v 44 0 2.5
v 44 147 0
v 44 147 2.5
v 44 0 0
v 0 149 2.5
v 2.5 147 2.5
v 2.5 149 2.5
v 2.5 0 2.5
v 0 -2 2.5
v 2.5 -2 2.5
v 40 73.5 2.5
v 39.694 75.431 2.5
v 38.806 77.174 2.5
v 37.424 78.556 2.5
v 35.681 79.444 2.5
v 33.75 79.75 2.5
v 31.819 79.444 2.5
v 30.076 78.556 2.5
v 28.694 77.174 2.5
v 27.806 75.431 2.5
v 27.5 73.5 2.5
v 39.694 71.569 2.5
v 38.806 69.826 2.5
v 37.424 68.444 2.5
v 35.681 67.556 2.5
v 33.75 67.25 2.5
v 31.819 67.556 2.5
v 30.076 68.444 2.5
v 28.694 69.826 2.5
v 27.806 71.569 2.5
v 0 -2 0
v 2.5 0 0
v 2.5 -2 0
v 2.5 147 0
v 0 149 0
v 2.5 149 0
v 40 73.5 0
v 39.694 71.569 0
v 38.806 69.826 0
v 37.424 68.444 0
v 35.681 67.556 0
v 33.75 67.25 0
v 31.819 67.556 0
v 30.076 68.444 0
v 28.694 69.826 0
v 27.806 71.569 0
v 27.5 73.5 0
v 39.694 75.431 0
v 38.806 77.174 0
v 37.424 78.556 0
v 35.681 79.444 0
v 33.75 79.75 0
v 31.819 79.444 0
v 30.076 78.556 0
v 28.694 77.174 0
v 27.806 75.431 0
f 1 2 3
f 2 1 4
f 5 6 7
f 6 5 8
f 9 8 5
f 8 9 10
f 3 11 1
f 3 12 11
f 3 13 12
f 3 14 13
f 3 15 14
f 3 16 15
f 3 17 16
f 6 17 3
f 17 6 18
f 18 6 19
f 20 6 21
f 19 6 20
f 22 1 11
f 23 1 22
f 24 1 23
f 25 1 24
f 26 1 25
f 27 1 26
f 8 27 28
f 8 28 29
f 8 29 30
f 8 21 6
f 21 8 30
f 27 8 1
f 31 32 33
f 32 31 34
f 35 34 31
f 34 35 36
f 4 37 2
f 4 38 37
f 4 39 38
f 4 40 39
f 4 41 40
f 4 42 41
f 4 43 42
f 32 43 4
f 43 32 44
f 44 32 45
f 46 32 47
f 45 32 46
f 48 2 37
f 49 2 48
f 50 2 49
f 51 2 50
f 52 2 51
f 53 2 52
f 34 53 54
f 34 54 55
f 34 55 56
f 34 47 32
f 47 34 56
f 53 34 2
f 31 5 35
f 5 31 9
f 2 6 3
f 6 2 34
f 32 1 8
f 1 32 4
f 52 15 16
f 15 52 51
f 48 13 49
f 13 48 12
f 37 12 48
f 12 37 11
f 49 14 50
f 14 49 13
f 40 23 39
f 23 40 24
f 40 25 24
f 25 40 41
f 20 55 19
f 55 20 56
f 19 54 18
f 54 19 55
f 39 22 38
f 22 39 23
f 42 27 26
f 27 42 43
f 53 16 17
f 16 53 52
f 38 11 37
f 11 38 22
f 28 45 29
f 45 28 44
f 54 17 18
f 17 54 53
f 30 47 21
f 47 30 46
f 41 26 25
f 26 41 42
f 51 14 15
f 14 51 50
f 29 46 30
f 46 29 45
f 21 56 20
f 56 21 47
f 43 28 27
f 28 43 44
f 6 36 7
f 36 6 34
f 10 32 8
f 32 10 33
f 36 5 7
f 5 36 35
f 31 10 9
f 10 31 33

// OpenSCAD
difference() {
  cube([44,147,2.5]);
  translate([44-12.5/2-4,147/2,-0.1])cylinder(d=12.5,h=2.7);
}
translate([0,-2,0]) cube([2.5,147+2*2,2.5]);
